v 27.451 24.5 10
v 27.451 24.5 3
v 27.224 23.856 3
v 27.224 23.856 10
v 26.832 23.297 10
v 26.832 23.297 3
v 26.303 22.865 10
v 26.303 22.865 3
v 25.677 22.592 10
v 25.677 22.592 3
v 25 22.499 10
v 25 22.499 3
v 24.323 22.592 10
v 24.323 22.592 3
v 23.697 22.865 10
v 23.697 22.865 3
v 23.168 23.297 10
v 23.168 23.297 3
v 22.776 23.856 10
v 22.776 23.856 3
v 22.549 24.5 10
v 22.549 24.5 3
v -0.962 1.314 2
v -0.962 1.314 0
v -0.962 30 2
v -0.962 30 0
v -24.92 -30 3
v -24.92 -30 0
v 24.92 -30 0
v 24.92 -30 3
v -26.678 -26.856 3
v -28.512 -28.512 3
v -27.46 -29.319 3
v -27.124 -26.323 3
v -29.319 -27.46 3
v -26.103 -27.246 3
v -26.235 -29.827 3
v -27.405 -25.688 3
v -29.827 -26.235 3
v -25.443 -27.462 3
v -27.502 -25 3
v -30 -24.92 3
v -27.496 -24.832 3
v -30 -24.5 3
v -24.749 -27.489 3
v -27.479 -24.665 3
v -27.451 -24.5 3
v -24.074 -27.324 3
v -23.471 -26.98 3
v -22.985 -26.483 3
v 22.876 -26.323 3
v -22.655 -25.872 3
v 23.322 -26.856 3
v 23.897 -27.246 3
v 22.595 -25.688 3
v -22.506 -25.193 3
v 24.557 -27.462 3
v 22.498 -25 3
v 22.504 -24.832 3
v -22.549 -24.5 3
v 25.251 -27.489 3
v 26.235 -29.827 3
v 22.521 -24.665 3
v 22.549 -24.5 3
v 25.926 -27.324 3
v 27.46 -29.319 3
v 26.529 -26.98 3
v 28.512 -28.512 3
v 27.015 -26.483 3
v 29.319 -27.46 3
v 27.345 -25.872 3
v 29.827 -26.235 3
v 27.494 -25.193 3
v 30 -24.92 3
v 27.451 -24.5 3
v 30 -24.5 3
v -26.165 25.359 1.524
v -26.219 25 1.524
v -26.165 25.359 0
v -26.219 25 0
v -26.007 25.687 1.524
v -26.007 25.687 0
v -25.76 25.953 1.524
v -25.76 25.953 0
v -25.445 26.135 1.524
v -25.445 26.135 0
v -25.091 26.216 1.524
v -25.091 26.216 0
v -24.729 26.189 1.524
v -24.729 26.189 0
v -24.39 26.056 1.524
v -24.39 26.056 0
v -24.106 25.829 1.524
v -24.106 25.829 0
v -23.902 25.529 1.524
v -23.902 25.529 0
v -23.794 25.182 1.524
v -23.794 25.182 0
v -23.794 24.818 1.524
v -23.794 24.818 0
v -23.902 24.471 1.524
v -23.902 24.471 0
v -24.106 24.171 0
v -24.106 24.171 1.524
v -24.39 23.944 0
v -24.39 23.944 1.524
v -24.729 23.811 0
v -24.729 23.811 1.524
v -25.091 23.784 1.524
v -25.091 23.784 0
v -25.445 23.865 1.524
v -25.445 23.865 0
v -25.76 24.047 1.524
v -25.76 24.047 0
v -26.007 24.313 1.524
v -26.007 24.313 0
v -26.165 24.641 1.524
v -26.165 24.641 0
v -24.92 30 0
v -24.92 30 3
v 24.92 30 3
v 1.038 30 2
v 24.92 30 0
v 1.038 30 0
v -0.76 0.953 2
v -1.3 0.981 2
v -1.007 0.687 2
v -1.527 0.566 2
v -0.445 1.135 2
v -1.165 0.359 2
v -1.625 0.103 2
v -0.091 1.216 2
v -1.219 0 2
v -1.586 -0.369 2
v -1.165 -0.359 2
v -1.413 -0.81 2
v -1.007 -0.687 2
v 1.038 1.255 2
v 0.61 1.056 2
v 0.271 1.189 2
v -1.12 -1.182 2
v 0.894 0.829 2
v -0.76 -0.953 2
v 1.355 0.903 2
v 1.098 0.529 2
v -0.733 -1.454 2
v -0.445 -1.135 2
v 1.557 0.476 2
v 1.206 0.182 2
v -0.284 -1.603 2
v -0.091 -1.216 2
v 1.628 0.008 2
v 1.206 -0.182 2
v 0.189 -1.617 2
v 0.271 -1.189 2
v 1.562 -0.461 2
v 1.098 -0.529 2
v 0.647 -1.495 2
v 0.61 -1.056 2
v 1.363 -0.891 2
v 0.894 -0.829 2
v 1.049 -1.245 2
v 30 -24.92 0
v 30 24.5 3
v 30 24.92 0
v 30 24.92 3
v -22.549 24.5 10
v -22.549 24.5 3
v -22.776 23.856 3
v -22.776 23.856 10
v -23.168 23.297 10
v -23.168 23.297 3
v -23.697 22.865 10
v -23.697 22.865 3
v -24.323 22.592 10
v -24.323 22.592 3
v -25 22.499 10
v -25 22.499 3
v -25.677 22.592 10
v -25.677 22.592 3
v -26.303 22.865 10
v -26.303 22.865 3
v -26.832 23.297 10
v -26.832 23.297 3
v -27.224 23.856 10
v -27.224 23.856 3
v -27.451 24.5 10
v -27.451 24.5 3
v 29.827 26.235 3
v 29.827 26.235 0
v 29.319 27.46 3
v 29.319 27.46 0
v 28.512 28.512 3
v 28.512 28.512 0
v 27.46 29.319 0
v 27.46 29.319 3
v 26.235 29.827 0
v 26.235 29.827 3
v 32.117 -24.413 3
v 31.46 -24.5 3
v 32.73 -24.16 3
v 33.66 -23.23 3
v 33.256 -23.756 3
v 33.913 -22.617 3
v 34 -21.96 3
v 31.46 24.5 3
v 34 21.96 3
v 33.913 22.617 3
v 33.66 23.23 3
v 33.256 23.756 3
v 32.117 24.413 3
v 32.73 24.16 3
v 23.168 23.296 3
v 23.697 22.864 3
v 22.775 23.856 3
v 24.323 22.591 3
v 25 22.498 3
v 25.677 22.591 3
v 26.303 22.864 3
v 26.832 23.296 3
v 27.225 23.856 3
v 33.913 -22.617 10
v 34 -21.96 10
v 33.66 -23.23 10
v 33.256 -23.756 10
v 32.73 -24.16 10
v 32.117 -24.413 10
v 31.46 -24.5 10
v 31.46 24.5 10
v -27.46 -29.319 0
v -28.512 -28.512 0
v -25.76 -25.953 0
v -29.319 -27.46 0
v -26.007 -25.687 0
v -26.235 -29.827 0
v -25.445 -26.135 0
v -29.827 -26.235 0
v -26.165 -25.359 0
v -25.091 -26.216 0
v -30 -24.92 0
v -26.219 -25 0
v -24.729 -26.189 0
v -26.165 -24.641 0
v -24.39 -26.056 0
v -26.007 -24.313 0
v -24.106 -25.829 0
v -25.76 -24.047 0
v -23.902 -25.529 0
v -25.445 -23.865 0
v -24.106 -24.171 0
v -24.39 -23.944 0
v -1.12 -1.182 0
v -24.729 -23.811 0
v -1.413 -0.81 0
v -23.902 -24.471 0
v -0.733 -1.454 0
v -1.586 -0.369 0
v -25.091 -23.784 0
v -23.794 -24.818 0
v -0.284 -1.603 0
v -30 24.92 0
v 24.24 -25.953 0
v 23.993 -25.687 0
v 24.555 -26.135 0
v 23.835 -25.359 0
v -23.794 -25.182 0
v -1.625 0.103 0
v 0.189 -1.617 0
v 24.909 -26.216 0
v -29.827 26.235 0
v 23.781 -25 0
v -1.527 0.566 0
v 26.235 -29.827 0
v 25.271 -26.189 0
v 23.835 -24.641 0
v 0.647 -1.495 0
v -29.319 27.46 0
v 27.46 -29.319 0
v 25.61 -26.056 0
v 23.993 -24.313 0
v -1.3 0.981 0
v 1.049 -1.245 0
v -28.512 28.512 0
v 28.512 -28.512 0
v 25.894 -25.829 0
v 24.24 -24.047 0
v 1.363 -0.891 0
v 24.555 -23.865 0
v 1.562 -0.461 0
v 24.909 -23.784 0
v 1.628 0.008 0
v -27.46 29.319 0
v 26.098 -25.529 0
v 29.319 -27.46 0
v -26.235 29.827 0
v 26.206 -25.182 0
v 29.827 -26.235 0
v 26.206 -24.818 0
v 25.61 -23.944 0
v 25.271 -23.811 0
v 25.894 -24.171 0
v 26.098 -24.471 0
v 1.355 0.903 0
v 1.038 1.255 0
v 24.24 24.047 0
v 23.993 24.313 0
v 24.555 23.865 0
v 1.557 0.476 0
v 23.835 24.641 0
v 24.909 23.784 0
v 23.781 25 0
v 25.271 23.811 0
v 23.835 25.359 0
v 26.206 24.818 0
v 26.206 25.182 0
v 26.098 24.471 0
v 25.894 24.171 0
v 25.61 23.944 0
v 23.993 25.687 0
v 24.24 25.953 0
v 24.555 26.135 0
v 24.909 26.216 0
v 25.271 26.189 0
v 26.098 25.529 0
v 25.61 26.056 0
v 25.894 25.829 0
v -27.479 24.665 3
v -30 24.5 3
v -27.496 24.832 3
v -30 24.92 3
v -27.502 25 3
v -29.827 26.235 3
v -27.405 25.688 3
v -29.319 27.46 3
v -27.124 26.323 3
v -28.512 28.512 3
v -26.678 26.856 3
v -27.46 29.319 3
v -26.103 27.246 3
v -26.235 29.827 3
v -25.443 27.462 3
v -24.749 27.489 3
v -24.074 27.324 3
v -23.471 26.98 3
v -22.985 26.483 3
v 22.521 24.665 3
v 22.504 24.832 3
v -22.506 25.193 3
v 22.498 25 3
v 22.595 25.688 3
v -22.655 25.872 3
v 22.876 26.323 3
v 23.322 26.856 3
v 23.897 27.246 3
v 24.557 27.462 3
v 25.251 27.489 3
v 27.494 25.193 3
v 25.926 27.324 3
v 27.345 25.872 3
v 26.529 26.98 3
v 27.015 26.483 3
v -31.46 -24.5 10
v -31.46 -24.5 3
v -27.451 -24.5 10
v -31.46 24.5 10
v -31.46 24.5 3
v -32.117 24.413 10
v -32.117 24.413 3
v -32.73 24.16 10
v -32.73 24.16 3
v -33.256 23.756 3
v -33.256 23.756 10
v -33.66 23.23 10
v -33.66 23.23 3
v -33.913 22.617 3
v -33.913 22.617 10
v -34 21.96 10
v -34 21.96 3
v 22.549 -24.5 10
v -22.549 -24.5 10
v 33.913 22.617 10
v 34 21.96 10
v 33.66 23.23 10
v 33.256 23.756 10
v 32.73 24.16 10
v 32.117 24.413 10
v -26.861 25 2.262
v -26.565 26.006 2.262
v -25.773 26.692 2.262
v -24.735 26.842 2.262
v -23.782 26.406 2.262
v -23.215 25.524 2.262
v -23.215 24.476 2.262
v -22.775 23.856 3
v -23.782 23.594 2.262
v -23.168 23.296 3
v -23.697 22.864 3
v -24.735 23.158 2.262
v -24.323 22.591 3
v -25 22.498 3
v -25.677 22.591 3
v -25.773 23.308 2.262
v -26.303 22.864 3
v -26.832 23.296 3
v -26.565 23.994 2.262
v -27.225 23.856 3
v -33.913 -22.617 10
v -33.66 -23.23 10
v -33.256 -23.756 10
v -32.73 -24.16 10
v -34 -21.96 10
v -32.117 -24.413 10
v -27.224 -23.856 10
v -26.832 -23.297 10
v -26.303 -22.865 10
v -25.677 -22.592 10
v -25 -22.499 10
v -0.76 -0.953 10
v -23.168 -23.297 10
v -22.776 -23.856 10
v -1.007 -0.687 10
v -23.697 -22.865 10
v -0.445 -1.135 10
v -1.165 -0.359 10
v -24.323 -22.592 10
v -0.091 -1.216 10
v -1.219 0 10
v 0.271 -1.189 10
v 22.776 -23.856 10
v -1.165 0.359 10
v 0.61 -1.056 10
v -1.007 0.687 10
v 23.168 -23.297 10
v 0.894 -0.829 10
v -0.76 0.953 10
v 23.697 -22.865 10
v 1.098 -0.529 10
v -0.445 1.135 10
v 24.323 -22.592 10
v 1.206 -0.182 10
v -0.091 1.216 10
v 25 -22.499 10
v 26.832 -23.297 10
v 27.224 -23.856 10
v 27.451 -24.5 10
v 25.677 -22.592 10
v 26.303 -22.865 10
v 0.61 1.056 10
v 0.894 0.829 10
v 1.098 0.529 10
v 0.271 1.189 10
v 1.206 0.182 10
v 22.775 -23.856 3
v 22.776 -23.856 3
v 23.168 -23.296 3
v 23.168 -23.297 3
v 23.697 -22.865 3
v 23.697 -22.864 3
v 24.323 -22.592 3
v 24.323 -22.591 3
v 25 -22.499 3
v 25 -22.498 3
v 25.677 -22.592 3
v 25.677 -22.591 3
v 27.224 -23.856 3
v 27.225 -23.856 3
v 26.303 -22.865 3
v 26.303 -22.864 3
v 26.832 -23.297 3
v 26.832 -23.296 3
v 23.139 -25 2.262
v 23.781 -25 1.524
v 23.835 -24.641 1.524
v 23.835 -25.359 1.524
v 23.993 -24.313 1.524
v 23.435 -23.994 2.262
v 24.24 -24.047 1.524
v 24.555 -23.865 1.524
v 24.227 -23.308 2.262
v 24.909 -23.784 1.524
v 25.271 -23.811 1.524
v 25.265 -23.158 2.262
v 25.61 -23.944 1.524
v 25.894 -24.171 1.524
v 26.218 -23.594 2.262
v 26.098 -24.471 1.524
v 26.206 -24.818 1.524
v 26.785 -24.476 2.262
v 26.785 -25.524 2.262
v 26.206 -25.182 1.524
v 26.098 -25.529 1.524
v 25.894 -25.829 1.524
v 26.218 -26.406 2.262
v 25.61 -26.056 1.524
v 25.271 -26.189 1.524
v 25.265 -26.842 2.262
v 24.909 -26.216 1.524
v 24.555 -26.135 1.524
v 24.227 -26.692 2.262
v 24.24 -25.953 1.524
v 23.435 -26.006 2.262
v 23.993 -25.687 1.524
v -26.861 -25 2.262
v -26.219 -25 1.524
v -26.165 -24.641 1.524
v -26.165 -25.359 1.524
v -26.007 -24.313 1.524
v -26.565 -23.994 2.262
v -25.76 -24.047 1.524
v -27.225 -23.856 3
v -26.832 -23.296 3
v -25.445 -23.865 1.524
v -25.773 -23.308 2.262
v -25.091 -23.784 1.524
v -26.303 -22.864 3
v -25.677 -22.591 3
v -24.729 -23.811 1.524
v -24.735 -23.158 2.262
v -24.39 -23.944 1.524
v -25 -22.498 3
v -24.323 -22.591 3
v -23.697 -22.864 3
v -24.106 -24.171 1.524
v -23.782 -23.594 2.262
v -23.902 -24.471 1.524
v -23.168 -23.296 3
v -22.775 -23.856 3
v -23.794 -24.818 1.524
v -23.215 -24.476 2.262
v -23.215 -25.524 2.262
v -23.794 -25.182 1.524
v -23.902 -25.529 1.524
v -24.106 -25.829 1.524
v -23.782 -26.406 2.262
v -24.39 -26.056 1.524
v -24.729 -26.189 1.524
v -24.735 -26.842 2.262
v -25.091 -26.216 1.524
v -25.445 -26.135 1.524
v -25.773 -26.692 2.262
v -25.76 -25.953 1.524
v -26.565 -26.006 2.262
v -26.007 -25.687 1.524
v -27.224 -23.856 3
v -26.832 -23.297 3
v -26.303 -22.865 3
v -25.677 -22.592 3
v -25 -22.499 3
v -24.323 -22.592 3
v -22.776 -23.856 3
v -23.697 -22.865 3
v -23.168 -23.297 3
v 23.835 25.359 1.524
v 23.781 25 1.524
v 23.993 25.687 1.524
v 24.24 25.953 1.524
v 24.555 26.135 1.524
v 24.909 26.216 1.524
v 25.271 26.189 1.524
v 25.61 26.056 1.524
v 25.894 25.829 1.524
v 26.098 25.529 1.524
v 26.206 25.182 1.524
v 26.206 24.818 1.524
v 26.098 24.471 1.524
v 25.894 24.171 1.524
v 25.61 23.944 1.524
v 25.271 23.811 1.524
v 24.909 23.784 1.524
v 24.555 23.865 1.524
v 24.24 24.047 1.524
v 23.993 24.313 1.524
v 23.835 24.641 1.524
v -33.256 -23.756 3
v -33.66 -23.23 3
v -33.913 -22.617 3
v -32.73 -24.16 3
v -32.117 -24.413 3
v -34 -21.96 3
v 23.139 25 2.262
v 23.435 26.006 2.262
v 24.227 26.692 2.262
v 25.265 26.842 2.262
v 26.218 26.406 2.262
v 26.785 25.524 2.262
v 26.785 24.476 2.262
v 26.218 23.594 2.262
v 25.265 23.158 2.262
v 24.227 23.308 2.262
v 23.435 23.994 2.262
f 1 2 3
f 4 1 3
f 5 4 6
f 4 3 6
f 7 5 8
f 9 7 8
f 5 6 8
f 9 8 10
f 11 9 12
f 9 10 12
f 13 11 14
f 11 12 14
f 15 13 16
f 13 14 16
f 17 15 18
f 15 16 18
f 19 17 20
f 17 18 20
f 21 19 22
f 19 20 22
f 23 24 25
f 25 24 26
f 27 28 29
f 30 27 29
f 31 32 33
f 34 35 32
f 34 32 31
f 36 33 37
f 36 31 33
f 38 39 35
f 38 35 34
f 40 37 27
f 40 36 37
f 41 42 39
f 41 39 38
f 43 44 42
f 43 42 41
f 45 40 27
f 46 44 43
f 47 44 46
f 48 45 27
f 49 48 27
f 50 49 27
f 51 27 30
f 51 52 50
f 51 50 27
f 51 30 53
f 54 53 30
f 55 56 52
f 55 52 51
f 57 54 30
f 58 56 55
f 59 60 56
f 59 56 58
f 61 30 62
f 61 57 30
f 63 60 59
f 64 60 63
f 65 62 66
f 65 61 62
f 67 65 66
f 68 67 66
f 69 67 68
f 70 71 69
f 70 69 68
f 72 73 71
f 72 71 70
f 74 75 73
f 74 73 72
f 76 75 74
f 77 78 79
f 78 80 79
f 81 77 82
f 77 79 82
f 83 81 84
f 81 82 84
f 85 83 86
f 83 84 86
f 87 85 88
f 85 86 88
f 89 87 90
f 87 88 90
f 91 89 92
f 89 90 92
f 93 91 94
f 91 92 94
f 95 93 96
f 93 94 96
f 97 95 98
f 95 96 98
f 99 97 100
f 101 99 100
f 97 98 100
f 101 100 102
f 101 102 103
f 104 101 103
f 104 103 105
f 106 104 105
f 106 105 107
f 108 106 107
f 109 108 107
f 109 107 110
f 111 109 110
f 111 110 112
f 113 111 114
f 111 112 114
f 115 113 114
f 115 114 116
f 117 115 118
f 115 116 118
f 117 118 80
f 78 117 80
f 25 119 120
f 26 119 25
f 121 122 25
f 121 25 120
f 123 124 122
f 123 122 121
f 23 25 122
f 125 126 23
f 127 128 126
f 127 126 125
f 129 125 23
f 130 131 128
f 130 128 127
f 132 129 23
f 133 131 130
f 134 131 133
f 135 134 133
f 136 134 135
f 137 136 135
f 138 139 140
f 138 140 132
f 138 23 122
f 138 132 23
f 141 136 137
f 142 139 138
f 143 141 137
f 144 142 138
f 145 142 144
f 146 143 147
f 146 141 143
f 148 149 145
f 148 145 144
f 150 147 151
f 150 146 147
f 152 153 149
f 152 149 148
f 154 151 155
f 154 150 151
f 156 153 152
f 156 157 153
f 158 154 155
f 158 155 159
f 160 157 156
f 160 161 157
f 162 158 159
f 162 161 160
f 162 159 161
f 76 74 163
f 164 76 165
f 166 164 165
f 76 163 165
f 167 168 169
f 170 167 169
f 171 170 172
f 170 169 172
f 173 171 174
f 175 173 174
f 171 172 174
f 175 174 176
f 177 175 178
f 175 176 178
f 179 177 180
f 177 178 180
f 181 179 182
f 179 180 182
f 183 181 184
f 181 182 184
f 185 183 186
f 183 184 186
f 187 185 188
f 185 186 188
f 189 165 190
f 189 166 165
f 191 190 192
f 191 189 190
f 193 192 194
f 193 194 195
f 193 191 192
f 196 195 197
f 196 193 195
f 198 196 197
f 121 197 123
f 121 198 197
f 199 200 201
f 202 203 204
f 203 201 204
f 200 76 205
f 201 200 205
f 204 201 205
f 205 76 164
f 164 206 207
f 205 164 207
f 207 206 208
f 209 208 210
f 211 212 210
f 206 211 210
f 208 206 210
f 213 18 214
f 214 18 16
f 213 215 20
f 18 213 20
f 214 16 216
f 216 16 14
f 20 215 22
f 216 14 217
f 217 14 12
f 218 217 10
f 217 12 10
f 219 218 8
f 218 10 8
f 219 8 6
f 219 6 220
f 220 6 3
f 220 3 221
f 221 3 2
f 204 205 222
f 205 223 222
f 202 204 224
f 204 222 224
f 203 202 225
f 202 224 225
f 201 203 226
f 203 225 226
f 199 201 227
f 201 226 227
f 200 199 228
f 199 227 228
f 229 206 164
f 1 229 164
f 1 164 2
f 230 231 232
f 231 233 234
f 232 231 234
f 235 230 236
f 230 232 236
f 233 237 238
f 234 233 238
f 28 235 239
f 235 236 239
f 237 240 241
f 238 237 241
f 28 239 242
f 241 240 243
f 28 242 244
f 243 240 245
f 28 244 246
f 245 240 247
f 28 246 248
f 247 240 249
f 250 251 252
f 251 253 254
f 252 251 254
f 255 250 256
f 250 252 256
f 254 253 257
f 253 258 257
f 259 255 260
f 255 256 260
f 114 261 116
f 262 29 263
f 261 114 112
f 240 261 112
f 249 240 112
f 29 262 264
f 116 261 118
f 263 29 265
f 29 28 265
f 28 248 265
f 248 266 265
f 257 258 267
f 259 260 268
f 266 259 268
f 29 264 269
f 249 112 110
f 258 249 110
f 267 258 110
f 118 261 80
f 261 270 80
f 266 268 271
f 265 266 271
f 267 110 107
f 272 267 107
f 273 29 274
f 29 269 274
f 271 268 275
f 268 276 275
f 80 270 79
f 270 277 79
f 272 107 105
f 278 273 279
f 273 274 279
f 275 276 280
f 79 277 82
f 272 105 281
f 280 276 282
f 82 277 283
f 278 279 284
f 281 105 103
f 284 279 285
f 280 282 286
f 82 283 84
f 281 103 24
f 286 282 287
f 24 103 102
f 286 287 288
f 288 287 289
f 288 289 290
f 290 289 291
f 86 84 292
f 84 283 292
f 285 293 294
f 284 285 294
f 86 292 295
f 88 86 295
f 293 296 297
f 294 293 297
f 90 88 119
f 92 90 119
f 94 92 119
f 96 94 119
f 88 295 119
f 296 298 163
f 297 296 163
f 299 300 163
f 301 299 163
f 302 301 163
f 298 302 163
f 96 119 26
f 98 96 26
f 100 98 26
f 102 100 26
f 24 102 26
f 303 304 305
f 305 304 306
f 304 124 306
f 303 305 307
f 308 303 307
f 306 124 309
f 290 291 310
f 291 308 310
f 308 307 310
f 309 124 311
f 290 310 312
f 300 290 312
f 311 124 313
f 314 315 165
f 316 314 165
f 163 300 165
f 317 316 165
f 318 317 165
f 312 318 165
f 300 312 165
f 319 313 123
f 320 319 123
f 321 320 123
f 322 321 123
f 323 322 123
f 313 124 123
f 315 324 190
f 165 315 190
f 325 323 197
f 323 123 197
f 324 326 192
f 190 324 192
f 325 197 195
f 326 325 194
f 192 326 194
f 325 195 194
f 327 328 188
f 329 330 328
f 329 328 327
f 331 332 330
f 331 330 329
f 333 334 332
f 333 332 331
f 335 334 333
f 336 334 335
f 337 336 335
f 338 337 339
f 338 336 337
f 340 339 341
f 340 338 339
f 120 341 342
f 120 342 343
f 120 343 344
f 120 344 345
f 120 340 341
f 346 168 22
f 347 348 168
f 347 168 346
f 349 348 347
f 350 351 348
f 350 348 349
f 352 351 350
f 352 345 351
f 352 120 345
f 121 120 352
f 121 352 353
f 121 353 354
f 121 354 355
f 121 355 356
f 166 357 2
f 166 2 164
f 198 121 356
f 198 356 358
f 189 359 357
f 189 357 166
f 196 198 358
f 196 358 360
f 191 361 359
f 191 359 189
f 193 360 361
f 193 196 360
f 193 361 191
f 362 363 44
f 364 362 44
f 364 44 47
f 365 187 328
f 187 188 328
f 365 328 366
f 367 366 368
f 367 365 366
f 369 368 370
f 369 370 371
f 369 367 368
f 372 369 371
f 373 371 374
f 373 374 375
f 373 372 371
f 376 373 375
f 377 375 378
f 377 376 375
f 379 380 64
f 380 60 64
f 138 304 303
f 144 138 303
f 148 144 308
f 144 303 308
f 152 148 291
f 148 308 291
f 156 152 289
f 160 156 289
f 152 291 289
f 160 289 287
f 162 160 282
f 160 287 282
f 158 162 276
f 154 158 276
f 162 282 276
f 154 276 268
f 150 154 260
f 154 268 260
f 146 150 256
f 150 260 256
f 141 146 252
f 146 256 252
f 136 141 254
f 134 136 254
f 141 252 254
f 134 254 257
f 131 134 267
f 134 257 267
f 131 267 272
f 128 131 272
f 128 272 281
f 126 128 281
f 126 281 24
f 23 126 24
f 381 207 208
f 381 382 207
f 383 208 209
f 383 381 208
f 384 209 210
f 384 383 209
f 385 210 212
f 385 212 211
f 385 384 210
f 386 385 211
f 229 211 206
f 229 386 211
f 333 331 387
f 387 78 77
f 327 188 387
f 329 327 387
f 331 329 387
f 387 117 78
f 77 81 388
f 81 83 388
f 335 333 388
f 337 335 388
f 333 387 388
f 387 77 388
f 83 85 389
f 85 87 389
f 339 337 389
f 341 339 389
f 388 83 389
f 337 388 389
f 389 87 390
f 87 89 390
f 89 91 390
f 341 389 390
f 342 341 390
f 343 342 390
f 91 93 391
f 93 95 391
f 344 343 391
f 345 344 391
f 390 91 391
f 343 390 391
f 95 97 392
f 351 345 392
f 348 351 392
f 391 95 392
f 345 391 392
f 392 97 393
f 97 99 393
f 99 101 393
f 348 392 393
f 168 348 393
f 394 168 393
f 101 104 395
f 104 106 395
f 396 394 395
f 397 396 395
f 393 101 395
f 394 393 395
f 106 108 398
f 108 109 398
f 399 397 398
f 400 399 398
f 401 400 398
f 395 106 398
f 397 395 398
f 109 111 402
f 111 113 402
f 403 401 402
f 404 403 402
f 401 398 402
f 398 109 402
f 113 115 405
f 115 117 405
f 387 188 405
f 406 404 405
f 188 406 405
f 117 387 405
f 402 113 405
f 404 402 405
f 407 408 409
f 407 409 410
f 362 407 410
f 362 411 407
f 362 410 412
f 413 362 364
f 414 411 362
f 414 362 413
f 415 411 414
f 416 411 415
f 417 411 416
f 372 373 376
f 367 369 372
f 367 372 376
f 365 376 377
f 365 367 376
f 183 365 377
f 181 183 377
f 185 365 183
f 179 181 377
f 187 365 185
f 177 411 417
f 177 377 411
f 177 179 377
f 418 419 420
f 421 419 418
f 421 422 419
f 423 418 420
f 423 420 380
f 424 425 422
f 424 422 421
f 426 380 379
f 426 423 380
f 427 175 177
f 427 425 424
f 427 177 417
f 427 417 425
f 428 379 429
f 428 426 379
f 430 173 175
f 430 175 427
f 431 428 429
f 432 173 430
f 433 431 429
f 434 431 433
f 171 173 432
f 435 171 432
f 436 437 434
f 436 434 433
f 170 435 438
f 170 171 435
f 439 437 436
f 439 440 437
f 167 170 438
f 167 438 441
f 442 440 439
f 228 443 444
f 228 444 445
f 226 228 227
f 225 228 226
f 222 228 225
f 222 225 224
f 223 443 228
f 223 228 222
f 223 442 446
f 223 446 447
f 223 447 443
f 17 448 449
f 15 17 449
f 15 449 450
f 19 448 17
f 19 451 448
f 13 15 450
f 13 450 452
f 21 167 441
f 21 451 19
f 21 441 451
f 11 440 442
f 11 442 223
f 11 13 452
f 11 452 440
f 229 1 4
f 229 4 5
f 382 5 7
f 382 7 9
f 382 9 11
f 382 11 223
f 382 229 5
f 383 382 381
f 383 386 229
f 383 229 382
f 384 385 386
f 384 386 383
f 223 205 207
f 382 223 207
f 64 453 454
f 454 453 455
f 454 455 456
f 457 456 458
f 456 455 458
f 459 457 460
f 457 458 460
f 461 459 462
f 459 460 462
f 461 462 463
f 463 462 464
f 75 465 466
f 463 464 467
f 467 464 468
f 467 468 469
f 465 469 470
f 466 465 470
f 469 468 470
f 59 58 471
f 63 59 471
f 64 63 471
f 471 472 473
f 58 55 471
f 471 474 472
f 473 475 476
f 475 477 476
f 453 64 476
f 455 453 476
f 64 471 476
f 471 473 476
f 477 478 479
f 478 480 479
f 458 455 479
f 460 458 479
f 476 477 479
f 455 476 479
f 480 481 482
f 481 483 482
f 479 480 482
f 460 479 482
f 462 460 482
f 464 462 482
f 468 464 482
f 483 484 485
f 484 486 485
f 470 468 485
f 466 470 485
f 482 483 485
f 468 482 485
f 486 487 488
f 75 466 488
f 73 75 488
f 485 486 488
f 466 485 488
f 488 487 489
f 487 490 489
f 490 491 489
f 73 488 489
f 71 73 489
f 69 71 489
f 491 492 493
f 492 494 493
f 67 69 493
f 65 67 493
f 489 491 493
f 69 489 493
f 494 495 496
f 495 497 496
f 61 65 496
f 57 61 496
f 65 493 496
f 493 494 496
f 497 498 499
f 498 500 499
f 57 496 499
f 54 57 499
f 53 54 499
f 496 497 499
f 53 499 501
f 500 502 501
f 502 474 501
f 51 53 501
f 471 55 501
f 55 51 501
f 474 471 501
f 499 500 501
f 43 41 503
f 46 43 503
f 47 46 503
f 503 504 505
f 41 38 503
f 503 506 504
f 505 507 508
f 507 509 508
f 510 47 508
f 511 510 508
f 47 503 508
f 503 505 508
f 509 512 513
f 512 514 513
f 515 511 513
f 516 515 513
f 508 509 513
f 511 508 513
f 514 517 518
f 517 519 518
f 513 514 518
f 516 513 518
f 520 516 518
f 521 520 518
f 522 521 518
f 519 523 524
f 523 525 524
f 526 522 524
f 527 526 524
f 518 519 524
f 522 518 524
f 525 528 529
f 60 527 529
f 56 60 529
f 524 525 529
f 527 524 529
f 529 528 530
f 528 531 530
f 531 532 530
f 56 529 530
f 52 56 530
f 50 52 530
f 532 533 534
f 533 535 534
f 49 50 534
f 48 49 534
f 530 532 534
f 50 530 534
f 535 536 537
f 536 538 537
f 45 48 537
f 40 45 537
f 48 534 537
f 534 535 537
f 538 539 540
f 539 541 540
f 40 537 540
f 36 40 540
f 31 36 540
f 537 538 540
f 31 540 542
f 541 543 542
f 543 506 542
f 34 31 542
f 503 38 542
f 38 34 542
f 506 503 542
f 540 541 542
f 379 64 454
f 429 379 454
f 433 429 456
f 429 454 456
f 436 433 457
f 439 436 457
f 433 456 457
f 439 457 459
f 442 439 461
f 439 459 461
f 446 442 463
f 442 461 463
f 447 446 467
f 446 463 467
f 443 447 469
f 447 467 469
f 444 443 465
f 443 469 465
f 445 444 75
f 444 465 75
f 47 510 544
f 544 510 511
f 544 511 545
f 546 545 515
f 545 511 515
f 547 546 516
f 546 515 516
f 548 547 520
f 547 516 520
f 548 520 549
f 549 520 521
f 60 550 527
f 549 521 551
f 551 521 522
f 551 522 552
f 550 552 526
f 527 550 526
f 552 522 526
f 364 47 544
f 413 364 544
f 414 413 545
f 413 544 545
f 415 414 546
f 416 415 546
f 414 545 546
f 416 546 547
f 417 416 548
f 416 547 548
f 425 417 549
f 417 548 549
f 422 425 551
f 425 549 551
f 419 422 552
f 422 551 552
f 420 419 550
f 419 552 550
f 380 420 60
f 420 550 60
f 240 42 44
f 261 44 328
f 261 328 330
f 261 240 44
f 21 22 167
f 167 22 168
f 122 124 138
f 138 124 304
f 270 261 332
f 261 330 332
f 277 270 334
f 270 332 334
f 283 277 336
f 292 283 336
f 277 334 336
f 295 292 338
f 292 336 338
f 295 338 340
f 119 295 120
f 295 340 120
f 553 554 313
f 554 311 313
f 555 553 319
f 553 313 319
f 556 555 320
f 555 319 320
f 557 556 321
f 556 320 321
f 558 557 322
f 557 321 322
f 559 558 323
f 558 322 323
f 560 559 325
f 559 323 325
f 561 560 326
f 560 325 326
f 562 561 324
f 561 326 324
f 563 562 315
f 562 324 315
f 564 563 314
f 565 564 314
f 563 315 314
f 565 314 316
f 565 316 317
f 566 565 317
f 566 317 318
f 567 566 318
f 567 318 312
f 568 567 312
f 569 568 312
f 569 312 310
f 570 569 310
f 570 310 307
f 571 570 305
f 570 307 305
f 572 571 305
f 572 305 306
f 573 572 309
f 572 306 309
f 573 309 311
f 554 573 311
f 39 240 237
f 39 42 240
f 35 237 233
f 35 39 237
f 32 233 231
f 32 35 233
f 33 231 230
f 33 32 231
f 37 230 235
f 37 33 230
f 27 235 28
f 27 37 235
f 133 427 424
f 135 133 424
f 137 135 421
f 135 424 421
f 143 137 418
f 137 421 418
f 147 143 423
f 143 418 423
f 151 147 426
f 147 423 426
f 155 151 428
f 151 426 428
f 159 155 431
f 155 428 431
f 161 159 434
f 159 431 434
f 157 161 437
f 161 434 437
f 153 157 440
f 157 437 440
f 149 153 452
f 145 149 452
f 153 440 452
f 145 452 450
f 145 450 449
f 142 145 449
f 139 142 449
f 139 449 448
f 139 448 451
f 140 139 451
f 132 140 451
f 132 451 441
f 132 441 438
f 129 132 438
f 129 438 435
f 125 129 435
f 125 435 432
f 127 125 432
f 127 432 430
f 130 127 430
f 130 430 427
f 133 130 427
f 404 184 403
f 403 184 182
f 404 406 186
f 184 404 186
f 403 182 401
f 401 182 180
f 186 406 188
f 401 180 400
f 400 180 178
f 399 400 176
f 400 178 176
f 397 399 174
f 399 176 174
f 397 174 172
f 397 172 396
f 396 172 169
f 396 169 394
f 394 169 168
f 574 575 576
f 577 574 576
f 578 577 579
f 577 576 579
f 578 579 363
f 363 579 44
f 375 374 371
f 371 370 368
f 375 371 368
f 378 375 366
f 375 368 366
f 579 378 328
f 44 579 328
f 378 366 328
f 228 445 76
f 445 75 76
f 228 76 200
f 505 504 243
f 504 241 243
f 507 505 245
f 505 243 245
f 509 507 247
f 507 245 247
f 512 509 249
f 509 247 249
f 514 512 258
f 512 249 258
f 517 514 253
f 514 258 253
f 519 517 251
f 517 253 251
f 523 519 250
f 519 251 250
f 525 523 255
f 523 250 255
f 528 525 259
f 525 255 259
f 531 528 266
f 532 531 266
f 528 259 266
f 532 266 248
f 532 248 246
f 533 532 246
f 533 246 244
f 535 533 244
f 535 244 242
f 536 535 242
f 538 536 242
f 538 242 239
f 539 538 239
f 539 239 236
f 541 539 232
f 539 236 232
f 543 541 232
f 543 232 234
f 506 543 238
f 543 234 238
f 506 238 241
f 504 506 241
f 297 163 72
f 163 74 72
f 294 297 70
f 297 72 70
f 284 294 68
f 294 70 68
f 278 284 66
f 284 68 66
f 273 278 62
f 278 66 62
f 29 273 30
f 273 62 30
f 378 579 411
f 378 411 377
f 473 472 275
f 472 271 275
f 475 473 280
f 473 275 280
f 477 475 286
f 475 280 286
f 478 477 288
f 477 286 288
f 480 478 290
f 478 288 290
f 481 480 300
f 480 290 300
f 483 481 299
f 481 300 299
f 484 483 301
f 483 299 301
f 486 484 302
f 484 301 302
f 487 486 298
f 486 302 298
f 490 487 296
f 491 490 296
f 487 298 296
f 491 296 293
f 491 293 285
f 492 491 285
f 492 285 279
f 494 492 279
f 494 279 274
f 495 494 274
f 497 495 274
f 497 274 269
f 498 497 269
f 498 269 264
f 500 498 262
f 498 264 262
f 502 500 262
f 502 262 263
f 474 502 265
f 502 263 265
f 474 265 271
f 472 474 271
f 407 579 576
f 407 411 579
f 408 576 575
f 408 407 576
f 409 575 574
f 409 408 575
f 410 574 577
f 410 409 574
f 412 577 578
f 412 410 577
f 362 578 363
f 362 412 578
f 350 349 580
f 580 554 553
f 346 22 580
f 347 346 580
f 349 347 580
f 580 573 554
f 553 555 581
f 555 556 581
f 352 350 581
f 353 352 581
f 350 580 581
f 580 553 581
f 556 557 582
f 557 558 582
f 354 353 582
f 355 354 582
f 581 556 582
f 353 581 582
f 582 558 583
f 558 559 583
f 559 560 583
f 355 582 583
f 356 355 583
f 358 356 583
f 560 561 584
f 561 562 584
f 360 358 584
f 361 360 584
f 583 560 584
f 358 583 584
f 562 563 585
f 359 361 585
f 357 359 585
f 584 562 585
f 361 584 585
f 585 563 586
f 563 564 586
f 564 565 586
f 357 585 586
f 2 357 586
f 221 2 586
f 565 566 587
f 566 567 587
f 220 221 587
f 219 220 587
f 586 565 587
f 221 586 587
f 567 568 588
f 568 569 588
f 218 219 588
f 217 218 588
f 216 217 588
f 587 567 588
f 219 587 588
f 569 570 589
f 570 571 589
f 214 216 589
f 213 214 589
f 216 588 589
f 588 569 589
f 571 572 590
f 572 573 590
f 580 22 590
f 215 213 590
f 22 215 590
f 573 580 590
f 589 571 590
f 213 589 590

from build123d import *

# Parameters (mm, degrees)
F0_W           = 60
F0_H           = 60
F1_DEPTH       = 3
F3_D           = 2.4384
F3_DEPTH       = 12.7
F3_CSINK_D     = 5.0038
F3_CSINK_ANGLE = 82
F3_TIP         = 0.7325692667
F4_R           = 5.08
F5_W           = 4
F5_H           = 49
F6_DEPTH       = 7
F7_R           = 2.54
F8_D           = 2.4384
F11_DEPTH      = 2


with BuildPart() as f1:
    # F0 (on Top) → F1 (new body)
    with BuildSketch(Plane.XY):
        Rectangle(F0_W, F0_H)
    extrude(amount=F1_DEPTH)

    # F3
    with Locations(Plane.XY.offset(3)):
        with Locations((-25, 25), (-25, -25), (25, -25), (25, 25)):
            CounterSinkHole(F3_D / 2, F3_CSINK_D / 2, depth=F3_DEPTH, counter_sink_angle=F3_CSINK_ANGLE)
            with Locations((0, 0, -(F3_DEPTH + F3_TIP / 2))):  # 118° drill point
                Cone(0, F3_D / 2, F3_TIP, mode=Mode.SUBTRACT)

    # F4
    f4_edges = [f1.edges().sort_by_distance(p)[0] for p in [
        (30, -30, 1.5),
        (-30, -30, 1.5),
        (30, 30, 1.5),
        (-30, 30, 1.5),
    ]]
    fillet(f4_edges, radius=F4_R)

    # F5 (on face) → F6 (join)
    with BuildSketch(Plane.XY.offset(3)):
        with Locations((32, 0)):
            Rectangle(F5_W, F5_H)
        with BuildLine():
            Line((30, -24.5), (30, 24.5))
            Line((30, 24.5), (27.4505423019, 24.5))
            ThreePointArc((27.4505423019, 24.5), (25, 22.498968698), (22.5494576981, 24.5))
            Line((22.5494576981, 24.5), (-22.5494576981, 24.5))
            ThreePointArc((-22.5494576981, 24.5), (-25, 22.498968698), (-27.4505423019, 24.5))
            Line((-27.4505423019, 24.5), (-30, 24.5))
            Line((-30, 24.5), (-30, -24.5))
            Line((-30, -24.5), (-27.4505423019, -24.5))
            ThreePointArc((-27.4505423019, -24.5), (-25, -22.498968698), (-22.5494576981, -24.5))
            Line((-22.5494576981, -24.5), (22.5494576981, -24.5))
            ThreePointArc((22.5494576981, -24.5), (25, -22.498968698), (27.4505423019, -24.5))
            Line((27.4505423019, -24.5), (30, -24.5))
        make_face()
        with Locations((-32, 0)):
            Rectangle(F5_W, F5_H)
    extrude(amount=F6_DEPTH)

    # F7
    f7_edges = [f1.edges().sort_by_distance(p)[0] for p in [
        (-34, -24.5, 6.5),
        (34, -24.5, 6.5),
        (34, 24.5, 6.5),
        (-34, 24.5, 6.5),
    ]]
    fillet(f7_edges, radius=F7_R)

    # F8 (through all)
    with Locations(Plane(origin=(0, 0, 0), x_dir=(1, 0, 0), z_dir=(0, 0, -1))):
        with Locations((0, 0)):
            Hole(F8_D / 2)

    # F10 (on face) → F11 (cut)
    with BuildSketch(Plane(origin=(0, 0, 0), x_dir=(1, 0, 0), z_dir=(0, 0, -1))):
        with BuildLine():
            Line((-0.9623644593, -1.3136032181), (-0.9623644593, -31.3395906546))
            Line((-0.9623644593, -31.3395906546), (1.0376355407, -31.3395906546))
            Line((1.0376355407, -31.3395906546), (1.0376355407, -1.2549945226))
            ThreePointArc((1.0376355407, -1.2549945226), (-0.0476988335, 1.6277050066), (-0.9623644593, -1.3136032181))
        make_face()
    extrude(amount=-F11_DEPTH, mode=Mode.SUBTRACT)


solid = f1.part
